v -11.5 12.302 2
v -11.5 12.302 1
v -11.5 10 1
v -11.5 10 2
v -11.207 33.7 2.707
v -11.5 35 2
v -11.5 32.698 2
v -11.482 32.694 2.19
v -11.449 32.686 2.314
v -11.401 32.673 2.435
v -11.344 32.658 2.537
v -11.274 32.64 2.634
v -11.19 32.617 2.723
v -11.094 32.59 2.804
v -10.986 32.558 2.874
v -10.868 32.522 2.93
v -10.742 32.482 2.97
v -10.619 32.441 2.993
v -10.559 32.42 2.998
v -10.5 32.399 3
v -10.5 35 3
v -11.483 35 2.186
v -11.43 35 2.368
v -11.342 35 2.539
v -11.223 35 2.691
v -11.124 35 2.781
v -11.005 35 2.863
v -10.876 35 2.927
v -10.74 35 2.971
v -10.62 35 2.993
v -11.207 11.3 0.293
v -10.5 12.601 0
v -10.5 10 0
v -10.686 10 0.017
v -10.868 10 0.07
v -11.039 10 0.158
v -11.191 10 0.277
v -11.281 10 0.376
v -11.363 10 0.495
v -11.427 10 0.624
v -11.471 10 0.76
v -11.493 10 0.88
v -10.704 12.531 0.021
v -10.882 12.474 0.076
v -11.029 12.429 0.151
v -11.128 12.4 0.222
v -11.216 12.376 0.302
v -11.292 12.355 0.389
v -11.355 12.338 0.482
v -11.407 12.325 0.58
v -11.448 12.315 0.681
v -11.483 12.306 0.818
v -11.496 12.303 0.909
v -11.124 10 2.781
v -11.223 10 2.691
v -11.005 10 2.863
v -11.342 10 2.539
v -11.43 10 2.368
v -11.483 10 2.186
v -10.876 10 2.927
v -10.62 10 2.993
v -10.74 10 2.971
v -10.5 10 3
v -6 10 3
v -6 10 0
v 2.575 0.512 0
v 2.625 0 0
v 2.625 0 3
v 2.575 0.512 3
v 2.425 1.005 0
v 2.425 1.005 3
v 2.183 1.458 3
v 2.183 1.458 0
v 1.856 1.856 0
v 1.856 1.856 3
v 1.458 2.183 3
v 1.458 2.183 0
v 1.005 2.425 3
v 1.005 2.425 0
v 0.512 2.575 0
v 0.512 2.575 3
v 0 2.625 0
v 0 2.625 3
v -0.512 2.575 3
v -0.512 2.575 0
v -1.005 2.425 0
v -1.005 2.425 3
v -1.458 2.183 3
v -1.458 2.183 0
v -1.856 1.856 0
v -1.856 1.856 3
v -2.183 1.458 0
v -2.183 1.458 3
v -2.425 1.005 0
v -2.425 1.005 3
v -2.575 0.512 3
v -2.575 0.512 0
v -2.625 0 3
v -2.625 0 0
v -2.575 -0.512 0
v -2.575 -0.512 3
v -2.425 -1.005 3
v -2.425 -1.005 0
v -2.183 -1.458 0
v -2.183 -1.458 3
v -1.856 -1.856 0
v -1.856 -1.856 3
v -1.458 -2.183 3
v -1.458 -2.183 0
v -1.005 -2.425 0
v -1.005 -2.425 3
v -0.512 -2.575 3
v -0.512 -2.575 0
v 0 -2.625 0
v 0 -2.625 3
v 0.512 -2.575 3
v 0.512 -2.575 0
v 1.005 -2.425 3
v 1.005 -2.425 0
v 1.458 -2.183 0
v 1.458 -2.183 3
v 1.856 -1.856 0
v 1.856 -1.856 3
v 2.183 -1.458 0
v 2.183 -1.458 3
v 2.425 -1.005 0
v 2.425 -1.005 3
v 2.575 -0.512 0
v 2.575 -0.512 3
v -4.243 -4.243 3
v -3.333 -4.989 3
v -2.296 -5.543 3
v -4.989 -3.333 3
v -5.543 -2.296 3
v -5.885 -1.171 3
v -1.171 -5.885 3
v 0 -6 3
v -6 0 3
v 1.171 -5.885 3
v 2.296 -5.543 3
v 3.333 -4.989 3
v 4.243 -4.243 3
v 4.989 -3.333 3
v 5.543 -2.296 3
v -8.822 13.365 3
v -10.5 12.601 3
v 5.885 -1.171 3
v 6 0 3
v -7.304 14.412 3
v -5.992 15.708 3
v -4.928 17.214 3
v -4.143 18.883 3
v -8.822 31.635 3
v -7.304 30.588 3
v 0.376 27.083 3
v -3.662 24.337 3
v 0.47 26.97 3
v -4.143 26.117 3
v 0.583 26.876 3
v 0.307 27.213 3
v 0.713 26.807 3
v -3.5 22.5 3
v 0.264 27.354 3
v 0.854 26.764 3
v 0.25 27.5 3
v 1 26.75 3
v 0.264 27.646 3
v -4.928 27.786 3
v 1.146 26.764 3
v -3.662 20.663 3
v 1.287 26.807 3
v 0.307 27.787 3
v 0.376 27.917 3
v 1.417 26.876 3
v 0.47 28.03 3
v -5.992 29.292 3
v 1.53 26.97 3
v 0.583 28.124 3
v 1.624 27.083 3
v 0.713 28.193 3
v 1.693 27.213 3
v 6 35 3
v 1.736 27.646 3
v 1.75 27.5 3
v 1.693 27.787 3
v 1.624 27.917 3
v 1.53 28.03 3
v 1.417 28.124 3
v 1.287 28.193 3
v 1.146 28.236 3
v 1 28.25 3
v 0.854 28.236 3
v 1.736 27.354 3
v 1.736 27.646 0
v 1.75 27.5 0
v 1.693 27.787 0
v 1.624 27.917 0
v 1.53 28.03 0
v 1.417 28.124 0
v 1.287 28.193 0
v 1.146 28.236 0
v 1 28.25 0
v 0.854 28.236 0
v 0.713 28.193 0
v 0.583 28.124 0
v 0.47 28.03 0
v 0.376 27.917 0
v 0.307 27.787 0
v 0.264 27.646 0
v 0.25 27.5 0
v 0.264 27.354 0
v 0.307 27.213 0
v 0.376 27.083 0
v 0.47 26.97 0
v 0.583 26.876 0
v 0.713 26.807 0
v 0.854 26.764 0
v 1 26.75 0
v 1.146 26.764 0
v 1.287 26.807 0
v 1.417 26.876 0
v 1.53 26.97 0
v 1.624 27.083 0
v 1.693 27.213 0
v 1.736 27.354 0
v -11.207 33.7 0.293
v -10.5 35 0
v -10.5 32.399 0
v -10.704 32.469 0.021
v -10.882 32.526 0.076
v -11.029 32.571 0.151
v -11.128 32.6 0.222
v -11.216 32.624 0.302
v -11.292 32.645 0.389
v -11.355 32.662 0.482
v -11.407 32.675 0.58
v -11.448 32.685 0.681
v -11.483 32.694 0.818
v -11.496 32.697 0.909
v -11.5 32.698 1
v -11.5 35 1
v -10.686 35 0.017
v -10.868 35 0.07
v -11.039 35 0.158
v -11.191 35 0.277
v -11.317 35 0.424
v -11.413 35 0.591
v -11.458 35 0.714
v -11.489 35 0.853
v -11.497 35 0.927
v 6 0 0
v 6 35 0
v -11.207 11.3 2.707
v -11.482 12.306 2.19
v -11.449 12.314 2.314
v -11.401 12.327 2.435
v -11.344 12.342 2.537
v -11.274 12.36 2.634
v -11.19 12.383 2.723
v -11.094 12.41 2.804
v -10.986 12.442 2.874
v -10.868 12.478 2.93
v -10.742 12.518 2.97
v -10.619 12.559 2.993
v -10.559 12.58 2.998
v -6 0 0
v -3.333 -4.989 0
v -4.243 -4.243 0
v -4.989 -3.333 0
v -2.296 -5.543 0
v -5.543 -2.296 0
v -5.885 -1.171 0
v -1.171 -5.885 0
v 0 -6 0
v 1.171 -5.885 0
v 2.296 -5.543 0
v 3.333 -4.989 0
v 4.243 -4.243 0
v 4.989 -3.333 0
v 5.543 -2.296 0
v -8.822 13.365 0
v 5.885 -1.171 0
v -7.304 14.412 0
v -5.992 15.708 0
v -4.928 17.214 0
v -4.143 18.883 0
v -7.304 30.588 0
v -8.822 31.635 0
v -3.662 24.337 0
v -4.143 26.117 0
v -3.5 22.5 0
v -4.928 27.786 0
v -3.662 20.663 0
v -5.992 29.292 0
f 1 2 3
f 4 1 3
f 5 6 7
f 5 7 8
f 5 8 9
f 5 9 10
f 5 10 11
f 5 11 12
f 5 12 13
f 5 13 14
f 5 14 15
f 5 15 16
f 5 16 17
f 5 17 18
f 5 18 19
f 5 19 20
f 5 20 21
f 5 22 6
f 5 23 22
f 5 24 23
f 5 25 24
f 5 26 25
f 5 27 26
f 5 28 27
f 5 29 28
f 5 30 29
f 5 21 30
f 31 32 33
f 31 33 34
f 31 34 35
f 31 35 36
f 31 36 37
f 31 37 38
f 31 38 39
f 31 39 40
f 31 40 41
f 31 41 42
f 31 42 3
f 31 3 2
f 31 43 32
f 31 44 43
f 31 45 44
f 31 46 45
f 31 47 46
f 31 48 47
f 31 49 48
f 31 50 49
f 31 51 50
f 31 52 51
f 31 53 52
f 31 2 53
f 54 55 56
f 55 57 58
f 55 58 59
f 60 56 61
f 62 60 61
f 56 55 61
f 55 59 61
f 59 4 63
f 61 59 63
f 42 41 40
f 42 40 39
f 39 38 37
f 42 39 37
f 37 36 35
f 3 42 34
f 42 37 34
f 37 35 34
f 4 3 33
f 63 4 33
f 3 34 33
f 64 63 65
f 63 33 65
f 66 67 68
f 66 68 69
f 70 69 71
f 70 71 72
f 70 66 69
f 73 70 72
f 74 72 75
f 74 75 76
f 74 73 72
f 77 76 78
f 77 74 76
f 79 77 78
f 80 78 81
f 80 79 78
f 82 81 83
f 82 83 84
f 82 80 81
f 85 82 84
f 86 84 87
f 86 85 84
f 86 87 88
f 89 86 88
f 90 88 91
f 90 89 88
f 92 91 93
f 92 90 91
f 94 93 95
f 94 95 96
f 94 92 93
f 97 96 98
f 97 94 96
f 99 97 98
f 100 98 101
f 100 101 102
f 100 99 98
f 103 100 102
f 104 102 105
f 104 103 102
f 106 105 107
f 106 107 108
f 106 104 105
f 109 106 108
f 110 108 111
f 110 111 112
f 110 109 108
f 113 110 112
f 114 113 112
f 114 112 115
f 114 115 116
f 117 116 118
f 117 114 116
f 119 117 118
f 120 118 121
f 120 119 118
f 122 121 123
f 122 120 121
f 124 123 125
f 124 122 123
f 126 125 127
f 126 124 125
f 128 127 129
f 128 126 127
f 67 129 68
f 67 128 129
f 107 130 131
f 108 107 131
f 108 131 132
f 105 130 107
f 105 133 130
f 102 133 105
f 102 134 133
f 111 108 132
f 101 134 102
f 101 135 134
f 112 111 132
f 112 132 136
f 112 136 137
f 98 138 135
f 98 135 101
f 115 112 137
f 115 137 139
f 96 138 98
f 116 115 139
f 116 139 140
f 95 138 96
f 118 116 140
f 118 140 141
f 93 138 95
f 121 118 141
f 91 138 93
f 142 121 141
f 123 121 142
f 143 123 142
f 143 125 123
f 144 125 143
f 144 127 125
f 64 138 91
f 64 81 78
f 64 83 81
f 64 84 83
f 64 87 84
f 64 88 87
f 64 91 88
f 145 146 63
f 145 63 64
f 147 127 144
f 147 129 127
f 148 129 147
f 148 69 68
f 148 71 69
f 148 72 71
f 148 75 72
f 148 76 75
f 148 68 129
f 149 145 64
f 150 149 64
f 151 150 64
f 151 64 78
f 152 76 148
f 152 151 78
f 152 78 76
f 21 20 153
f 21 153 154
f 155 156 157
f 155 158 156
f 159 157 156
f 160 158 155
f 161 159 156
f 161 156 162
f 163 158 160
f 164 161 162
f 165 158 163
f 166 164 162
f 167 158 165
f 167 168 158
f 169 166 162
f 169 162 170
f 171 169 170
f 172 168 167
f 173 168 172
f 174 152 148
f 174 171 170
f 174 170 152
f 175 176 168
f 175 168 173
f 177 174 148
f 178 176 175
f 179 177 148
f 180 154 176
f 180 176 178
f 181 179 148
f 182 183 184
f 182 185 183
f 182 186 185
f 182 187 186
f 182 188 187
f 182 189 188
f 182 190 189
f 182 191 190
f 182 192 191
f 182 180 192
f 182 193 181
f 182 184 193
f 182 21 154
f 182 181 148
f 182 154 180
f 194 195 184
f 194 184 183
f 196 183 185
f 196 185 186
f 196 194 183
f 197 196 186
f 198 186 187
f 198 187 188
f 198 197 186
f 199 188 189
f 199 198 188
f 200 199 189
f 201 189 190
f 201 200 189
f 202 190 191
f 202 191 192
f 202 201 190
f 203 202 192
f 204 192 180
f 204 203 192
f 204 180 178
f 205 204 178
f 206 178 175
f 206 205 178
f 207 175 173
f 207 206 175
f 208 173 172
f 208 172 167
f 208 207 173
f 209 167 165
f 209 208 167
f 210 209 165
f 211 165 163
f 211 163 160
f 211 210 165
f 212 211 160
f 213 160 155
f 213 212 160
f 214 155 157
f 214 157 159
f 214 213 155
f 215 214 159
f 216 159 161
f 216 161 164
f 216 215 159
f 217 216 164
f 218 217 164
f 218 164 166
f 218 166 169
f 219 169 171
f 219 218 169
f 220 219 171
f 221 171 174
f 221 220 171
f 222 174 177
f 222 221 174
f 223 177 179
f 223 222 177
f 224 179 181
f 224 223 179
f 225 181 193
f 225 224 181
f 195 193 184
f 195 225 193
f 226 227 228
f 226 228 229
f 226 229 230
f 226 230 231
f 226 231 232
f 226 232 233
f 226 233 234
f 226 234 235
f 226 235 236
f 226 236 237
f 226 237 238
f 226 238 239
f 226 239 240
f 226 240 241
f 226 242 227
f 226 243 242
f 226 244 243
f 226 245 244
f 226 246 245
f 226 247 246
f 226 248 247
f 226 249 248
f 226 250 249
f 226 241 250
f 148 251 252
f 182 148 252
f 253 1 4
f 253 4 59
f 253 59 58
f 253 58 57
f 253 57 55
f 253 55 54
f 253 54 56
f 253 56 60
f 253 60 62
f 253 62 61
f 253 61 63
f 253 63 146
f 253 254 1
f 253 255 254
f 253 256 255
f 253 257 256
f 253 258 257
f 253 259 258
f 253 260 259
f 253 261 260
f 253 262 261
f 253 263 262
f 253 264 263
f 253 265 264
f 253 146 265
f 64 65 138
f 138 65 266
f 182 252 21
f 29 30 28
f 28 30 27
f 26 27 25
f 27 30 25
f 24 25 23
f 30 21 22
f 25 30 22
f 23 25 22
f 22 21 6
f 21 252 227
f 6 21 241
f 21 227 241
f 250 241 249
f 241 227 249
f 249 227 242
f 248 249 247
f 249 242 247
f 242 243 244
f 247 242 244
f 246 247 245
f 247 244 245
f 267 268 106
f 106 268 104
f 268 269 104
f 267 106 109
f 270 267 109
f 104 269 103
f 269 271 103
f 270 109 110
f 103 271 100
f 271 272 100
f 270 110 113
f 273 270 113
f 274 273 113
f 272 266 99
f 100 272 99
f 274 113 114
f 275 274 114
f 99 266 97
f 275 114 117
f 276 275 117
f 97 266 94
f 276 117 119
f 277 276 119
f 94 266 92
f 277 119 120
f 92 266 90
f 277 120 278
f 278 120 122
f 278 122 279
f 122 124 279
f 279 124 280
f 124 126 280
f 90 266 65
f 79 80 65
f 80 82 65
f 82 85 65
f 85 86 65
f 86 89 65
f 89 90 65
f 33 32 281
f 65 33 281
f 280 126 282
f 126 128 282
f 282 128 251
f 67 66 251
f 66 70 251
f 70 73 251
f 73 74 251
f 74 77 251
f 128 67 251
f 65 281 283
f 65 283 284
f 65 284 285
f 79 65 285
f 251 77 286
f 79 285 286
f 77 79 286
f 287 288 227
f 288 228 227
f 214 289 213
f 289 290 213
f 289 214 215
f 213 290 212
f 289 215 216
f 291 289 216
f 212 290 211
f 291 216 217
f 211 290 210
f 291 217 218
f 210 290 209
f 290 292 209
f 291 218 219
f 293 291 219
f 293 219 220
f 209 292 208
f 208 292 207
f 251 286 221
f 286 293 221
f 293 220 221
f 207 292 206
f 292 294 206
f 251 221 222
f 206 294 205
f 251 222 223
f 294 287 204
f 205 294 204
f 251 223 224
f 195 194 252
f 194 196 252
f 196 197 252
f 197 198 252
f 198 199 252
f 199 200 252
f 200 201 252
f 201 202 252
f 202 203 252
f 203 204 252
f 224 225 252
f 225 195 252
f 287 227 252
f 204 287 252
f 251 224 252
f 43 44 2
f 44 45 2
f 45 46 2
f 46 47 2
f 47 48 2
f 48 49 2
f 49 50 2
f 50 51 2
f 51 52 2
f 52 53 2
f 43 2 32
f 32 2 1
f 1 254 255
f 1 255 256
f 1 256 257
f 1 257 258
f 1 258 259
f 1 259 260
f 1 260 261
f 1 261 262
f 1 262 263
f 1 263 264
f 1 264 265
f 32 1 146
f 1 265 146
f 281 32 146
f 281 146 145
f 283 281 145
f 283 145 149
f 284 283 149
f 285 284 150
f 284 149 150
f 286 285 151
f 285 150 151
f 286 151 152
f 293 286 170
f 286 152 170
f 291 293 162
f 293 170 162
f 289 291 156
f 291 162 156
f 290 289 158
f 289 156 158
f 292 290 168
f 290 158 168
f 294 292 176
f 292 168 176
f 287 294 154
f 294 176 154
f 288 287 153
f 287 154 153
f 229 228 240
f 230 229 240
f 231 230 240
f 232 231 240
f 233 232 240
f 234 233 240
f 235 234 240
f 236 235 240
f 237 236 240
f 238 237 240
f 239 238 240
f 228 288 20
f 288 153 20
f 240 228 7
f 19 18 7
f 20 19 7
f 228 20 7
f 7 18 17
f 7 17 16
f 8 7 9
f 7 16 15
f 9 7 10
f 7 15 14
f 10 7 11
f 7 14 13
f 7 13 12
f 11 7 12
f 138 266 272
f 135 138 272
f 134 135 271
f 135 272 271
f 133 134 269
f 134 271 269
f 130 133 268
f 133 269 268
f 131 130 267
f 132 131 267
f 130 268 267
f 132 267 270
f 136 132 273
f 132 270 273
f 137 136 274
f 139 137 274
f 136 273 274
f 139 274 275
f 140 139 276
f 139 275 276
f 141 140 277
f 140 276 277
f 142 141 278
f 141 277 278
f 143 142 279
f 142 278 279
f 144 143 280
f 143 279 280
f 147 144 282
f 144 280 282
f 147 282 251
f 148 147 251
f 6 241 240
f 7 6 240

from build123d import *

# Parameters (mm, degrees)
SKETCH1_R           = 0.75
SKETCH1_R_2         = 2.625
BOSS_EXTRUDE1_DEPTH = 3
VARFILLET1_R        = 1
CUT_EXTRUDE1_REACH  = 38.963
SKETCH2_R           = 10.5


with BuildPart() as part:
    # Sketch1 → Boss-Extrude1 (new body)
    with BuildSketch(Plane.XY):
        with BuildLine():
            Line((-6, 10), (-6, 0))
            ThreePointArc((-6, 0), (0, -6), (6, 0))
            Line((6, 0), (6, 35))
            Line((6, 35), (-11.5, 35))
            Line((-11.5, 35), (-11.5, 10))
            Line((-11.5, 10), (-6, 10))
        make_face()
        with Locations((1, 27.5)):
            Circle(SKETCH1_R, mode=Mode.SUBTRACT)
        Circle(SKETCH1_R_2, mode=Mode.SUBTRACT)
    extrude(amount=BOSS_EXTRUDE1_DEPTH)

    # VarFillet1
    varfillet1_edges = [part.edges().sort_by_distance(p)[0] for p in [
        (-11.5, 22.5, 0),
        (-11.5, 22.5, 3),
    ]]
    fillet(varfillet1_edges, radius=VARFILLET1_R)

    # Sketch2 → Cut-Extrude1 (cut, up to next)
    with BuildSketch(Plane.XY.offset(3), mode=Mode.PRIVATE) as cut_extrude1_sk1:
        with Locations((-14, 22.5)):
            Circle(SKETCH2_R)
    cut_extrude1_tool1 = extrude(cut_extrude1_sk1.sketch, amount=-CUT_EXTRUDE1_REACH, mode=Mode.PRIVATE) & part.part
    add(cut_extrude1_tool1.solids().sort_by_distance((-14, 22.5, 3))[0], mode=Mode.SUBTRACT)


solid = part.part
